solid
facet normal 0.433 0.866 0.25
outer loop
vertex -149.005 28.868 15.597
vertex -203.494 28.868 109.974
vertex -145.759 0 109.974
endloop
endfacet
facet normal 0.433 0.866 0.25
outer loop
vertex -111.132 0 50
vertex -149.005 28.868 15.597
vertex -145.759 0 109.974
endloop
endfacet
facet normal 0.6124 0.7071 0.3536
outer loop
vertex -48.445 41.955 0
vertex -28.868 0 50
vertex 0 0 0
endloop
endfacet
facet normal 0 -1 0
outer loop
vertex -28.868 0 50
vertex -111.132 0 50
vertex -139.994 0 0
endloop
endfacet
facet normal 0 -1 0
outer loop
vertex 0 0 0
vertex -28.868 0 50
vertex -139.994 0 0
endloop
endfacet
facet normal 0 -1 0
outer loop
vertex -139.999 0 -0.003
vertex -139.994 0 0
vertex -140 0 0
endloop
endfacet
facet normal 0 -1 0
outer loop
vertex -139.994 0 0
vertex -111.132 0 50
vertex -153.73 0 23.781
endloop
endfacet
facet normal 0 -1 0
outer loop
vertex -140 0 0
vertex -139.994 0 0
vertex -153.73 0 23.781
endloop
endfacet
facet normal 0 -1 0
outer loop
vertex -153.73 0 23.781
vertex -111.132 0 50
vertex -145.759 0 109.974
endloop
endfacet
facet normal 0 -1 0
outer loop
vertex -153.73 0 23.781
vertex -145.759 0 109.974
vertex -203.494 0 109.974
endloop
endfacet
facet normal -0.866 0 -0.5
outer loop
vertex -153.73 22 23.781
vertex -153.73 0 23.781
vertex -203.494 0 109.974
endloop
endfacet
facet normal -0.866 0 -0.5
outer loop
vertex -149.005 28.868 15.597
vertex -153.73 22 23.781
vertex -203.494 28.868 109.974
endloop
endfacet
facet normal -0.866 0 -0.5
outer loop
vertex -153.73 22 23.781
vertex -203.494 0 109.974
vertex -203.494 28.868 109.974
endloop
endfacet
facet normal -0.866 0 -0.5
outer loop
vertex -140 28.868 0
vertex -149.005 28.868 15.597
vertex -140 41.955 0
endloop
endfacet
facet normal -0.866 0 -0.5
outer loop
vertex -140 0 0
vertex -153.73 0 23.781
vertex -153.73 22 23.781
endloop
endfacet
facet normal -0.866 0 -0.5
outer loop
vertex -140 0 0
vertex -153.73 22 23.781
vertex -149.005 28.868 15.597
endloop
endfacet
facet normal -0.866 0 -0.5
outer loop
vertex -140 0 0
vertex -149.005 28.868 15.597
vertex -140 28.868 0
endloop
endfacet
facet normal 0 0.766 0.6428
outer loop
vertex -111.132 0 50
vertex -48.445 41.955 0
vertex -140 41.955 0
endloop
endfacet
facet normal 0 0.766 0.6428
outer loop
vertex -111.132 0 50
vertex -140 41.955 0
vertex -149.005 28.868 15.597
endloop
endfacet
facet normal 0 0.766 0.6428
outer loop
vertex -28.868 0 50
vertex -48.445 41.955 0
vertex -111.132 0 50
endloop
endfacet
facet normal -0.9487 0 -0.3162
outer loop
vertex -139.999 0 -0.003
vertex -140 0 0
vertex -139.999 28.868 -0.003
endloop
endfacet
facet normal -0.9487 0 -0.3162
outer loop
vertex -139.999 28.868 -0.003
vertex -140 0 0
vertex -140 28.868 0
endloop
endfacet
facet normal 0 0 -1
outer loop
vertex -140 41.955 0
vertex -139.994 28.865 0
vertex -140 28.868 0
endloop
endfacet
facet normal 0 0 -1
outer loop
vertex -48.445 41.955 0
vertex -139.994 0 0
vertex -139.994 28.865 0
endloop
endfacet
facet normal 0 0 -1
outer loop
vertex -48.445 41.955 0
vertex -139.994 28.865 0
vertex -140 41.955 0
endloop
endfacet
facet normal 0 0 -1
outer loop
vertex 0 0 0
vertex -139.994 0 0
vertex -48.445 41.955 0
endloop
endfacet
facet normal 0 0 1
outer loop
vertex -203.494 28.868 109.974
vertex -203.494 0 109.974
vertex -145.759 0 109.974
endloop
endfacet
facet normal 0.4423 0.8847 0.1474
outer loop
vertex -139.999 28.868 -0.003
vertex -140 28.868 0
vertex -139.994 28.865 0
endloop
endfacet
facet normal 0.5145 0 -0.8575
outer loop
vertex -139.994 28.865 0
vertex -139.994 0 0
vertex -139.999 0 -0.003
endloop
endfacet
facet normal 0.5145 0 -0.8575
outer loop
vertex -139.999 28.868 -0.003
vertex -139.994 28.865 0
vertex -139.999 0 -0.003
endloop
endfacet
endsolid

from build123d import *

# Parameters (mm, degrees)
EXTRUDE1_DEPTH          = 153.73
EXTRUDE2_DEPTH          = 127.02
CUT_EXTRUDE1_DEPTH      = 42.954981559
CUT_EXTRUDE2_DEPTH      = 40
CUT_EXTRUDE2_DEPTH_BACK = 60
SKETCH10_W              = 60.093449
SKETCH10_H              = 28.719359
CUT_EXTRUDE3_DEPTH      = 42.954981559


with BuildPart() as part:
    # Sketch1 → Extrude1 (new body)
    with BuildSketch(Plane(origin=(0, 0, 0), x_dir=(0, 0, -1), z_dir=(1, 0, 0))):
        Polygon((0, 0), (0, 41.954981559), (-50, 0), align=None)
    extrude(amount=-EXTRUDE1_DEPTH)

    # Sketch4 → Extrude2 (add)
    with BuildSketch(Plane(origin=(-98.508529611, 0, 170.621778265), x_dir=(0.866025404, 0, 0.5), z_dir=(-0.5, 0, 0.866025404))):
        Polygon((-121.243556529, 28.867513459), (-71.243556529, 0), (-121.243556529, 0), align=None)
    extrude(amount=-EXTRUDE2_DEPTH)

    # Sketch6 → Cut-Extrude1 (cut, through all)
    with BuildSketch(Plane(origin=(0, 0, 0), x_dir=(1, 0, 0), z_dir=(0, 1, 0))):
        Polygon((-161.048753394, -36.457510316), (-140, 0), (-161.048753394, 0), align=None)
    extrude(amount=CUT_EXTRUDE1_DEPTH, mode=Mode.SUBTRACT)

    # Sketch9 → Cut-Extrude2 (cut, two sides)
    with BuildSketch(Plane(origin=(-28.867513459, 0, 50), x_dir=(0.866025404, 0, 0.5), z_dir=(-0.5, 0, 0.866025404))) as cut_extrude2_sk:
        Polygon((33.293903828, 48.675552454), (33.293903828, 0), (0, 0), (-48.675552454, 48.675552454), align=None)
    extrude(amount=CUT_EXTRUDE2_DEPTH, mode=Mode.SUBTRACT)
    extrude(cut_extrude2_sk.sketch, amount=-CUT_EXTRUDE2_DEPTH_BACK, mode=Mode.SUBTRACT)

    # Sketch10 → Cut-Extrude3 (cut, through all)
    with BuildSketch(Plane(origin=(0, 0, 0), x_dir=(1, 0, 0), z_dir=(0, 1, 0))):
        with Locations((-173.7940015, -124.3340965)):
            Rectangle(SKETCH10_W, SKETCH10_H)
    extrude(amount=CUT_EXTRUDE3_DEPTH, mode=Mode.SUBTRACT)


solid = part.part
